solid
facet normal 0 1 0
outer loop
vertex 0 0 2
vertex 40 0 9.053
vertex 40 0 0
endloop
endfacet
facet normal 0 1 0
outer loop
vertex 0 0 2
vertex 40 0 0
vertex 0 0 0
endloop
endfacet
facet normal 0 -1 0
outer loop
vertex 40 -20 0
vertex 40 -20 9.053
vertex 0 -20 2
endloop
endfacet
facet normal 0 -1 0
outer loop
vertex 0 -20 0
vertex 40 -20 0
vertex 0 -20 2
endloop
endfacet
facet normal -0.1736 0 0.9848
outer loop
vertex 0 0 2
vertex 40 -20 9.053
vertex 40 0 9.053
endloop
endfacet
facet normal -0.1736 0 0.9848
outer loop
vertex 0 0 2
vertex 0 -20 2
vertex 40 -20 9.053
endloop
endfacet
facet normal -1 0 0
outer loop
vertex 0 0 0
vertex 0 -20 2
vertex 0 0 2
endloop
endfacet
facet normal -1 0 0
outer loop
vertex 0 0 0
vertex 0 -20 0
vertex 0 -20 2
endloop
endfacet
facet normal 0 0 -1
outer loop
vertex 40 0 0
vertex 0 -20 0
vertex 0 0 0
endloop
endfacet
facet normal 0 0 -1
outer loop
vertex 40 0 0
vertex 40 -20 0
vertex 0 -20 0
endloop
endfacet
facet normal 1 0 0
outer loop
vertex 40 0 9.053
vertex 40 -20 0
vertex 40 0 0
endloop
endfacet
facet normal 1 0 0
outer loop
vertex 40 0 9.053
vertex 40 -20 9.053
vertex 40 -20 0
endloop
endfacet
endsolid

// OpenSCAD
// 40 mm long ramp rising 7.05 mm (10 deg from horizontal), up-facing: stair stepping.
rotate([90,0,0]) linear_extrude(20) polygon([[0,0],[40,0],[40,2+40*tan(10)],[0,2]]);
